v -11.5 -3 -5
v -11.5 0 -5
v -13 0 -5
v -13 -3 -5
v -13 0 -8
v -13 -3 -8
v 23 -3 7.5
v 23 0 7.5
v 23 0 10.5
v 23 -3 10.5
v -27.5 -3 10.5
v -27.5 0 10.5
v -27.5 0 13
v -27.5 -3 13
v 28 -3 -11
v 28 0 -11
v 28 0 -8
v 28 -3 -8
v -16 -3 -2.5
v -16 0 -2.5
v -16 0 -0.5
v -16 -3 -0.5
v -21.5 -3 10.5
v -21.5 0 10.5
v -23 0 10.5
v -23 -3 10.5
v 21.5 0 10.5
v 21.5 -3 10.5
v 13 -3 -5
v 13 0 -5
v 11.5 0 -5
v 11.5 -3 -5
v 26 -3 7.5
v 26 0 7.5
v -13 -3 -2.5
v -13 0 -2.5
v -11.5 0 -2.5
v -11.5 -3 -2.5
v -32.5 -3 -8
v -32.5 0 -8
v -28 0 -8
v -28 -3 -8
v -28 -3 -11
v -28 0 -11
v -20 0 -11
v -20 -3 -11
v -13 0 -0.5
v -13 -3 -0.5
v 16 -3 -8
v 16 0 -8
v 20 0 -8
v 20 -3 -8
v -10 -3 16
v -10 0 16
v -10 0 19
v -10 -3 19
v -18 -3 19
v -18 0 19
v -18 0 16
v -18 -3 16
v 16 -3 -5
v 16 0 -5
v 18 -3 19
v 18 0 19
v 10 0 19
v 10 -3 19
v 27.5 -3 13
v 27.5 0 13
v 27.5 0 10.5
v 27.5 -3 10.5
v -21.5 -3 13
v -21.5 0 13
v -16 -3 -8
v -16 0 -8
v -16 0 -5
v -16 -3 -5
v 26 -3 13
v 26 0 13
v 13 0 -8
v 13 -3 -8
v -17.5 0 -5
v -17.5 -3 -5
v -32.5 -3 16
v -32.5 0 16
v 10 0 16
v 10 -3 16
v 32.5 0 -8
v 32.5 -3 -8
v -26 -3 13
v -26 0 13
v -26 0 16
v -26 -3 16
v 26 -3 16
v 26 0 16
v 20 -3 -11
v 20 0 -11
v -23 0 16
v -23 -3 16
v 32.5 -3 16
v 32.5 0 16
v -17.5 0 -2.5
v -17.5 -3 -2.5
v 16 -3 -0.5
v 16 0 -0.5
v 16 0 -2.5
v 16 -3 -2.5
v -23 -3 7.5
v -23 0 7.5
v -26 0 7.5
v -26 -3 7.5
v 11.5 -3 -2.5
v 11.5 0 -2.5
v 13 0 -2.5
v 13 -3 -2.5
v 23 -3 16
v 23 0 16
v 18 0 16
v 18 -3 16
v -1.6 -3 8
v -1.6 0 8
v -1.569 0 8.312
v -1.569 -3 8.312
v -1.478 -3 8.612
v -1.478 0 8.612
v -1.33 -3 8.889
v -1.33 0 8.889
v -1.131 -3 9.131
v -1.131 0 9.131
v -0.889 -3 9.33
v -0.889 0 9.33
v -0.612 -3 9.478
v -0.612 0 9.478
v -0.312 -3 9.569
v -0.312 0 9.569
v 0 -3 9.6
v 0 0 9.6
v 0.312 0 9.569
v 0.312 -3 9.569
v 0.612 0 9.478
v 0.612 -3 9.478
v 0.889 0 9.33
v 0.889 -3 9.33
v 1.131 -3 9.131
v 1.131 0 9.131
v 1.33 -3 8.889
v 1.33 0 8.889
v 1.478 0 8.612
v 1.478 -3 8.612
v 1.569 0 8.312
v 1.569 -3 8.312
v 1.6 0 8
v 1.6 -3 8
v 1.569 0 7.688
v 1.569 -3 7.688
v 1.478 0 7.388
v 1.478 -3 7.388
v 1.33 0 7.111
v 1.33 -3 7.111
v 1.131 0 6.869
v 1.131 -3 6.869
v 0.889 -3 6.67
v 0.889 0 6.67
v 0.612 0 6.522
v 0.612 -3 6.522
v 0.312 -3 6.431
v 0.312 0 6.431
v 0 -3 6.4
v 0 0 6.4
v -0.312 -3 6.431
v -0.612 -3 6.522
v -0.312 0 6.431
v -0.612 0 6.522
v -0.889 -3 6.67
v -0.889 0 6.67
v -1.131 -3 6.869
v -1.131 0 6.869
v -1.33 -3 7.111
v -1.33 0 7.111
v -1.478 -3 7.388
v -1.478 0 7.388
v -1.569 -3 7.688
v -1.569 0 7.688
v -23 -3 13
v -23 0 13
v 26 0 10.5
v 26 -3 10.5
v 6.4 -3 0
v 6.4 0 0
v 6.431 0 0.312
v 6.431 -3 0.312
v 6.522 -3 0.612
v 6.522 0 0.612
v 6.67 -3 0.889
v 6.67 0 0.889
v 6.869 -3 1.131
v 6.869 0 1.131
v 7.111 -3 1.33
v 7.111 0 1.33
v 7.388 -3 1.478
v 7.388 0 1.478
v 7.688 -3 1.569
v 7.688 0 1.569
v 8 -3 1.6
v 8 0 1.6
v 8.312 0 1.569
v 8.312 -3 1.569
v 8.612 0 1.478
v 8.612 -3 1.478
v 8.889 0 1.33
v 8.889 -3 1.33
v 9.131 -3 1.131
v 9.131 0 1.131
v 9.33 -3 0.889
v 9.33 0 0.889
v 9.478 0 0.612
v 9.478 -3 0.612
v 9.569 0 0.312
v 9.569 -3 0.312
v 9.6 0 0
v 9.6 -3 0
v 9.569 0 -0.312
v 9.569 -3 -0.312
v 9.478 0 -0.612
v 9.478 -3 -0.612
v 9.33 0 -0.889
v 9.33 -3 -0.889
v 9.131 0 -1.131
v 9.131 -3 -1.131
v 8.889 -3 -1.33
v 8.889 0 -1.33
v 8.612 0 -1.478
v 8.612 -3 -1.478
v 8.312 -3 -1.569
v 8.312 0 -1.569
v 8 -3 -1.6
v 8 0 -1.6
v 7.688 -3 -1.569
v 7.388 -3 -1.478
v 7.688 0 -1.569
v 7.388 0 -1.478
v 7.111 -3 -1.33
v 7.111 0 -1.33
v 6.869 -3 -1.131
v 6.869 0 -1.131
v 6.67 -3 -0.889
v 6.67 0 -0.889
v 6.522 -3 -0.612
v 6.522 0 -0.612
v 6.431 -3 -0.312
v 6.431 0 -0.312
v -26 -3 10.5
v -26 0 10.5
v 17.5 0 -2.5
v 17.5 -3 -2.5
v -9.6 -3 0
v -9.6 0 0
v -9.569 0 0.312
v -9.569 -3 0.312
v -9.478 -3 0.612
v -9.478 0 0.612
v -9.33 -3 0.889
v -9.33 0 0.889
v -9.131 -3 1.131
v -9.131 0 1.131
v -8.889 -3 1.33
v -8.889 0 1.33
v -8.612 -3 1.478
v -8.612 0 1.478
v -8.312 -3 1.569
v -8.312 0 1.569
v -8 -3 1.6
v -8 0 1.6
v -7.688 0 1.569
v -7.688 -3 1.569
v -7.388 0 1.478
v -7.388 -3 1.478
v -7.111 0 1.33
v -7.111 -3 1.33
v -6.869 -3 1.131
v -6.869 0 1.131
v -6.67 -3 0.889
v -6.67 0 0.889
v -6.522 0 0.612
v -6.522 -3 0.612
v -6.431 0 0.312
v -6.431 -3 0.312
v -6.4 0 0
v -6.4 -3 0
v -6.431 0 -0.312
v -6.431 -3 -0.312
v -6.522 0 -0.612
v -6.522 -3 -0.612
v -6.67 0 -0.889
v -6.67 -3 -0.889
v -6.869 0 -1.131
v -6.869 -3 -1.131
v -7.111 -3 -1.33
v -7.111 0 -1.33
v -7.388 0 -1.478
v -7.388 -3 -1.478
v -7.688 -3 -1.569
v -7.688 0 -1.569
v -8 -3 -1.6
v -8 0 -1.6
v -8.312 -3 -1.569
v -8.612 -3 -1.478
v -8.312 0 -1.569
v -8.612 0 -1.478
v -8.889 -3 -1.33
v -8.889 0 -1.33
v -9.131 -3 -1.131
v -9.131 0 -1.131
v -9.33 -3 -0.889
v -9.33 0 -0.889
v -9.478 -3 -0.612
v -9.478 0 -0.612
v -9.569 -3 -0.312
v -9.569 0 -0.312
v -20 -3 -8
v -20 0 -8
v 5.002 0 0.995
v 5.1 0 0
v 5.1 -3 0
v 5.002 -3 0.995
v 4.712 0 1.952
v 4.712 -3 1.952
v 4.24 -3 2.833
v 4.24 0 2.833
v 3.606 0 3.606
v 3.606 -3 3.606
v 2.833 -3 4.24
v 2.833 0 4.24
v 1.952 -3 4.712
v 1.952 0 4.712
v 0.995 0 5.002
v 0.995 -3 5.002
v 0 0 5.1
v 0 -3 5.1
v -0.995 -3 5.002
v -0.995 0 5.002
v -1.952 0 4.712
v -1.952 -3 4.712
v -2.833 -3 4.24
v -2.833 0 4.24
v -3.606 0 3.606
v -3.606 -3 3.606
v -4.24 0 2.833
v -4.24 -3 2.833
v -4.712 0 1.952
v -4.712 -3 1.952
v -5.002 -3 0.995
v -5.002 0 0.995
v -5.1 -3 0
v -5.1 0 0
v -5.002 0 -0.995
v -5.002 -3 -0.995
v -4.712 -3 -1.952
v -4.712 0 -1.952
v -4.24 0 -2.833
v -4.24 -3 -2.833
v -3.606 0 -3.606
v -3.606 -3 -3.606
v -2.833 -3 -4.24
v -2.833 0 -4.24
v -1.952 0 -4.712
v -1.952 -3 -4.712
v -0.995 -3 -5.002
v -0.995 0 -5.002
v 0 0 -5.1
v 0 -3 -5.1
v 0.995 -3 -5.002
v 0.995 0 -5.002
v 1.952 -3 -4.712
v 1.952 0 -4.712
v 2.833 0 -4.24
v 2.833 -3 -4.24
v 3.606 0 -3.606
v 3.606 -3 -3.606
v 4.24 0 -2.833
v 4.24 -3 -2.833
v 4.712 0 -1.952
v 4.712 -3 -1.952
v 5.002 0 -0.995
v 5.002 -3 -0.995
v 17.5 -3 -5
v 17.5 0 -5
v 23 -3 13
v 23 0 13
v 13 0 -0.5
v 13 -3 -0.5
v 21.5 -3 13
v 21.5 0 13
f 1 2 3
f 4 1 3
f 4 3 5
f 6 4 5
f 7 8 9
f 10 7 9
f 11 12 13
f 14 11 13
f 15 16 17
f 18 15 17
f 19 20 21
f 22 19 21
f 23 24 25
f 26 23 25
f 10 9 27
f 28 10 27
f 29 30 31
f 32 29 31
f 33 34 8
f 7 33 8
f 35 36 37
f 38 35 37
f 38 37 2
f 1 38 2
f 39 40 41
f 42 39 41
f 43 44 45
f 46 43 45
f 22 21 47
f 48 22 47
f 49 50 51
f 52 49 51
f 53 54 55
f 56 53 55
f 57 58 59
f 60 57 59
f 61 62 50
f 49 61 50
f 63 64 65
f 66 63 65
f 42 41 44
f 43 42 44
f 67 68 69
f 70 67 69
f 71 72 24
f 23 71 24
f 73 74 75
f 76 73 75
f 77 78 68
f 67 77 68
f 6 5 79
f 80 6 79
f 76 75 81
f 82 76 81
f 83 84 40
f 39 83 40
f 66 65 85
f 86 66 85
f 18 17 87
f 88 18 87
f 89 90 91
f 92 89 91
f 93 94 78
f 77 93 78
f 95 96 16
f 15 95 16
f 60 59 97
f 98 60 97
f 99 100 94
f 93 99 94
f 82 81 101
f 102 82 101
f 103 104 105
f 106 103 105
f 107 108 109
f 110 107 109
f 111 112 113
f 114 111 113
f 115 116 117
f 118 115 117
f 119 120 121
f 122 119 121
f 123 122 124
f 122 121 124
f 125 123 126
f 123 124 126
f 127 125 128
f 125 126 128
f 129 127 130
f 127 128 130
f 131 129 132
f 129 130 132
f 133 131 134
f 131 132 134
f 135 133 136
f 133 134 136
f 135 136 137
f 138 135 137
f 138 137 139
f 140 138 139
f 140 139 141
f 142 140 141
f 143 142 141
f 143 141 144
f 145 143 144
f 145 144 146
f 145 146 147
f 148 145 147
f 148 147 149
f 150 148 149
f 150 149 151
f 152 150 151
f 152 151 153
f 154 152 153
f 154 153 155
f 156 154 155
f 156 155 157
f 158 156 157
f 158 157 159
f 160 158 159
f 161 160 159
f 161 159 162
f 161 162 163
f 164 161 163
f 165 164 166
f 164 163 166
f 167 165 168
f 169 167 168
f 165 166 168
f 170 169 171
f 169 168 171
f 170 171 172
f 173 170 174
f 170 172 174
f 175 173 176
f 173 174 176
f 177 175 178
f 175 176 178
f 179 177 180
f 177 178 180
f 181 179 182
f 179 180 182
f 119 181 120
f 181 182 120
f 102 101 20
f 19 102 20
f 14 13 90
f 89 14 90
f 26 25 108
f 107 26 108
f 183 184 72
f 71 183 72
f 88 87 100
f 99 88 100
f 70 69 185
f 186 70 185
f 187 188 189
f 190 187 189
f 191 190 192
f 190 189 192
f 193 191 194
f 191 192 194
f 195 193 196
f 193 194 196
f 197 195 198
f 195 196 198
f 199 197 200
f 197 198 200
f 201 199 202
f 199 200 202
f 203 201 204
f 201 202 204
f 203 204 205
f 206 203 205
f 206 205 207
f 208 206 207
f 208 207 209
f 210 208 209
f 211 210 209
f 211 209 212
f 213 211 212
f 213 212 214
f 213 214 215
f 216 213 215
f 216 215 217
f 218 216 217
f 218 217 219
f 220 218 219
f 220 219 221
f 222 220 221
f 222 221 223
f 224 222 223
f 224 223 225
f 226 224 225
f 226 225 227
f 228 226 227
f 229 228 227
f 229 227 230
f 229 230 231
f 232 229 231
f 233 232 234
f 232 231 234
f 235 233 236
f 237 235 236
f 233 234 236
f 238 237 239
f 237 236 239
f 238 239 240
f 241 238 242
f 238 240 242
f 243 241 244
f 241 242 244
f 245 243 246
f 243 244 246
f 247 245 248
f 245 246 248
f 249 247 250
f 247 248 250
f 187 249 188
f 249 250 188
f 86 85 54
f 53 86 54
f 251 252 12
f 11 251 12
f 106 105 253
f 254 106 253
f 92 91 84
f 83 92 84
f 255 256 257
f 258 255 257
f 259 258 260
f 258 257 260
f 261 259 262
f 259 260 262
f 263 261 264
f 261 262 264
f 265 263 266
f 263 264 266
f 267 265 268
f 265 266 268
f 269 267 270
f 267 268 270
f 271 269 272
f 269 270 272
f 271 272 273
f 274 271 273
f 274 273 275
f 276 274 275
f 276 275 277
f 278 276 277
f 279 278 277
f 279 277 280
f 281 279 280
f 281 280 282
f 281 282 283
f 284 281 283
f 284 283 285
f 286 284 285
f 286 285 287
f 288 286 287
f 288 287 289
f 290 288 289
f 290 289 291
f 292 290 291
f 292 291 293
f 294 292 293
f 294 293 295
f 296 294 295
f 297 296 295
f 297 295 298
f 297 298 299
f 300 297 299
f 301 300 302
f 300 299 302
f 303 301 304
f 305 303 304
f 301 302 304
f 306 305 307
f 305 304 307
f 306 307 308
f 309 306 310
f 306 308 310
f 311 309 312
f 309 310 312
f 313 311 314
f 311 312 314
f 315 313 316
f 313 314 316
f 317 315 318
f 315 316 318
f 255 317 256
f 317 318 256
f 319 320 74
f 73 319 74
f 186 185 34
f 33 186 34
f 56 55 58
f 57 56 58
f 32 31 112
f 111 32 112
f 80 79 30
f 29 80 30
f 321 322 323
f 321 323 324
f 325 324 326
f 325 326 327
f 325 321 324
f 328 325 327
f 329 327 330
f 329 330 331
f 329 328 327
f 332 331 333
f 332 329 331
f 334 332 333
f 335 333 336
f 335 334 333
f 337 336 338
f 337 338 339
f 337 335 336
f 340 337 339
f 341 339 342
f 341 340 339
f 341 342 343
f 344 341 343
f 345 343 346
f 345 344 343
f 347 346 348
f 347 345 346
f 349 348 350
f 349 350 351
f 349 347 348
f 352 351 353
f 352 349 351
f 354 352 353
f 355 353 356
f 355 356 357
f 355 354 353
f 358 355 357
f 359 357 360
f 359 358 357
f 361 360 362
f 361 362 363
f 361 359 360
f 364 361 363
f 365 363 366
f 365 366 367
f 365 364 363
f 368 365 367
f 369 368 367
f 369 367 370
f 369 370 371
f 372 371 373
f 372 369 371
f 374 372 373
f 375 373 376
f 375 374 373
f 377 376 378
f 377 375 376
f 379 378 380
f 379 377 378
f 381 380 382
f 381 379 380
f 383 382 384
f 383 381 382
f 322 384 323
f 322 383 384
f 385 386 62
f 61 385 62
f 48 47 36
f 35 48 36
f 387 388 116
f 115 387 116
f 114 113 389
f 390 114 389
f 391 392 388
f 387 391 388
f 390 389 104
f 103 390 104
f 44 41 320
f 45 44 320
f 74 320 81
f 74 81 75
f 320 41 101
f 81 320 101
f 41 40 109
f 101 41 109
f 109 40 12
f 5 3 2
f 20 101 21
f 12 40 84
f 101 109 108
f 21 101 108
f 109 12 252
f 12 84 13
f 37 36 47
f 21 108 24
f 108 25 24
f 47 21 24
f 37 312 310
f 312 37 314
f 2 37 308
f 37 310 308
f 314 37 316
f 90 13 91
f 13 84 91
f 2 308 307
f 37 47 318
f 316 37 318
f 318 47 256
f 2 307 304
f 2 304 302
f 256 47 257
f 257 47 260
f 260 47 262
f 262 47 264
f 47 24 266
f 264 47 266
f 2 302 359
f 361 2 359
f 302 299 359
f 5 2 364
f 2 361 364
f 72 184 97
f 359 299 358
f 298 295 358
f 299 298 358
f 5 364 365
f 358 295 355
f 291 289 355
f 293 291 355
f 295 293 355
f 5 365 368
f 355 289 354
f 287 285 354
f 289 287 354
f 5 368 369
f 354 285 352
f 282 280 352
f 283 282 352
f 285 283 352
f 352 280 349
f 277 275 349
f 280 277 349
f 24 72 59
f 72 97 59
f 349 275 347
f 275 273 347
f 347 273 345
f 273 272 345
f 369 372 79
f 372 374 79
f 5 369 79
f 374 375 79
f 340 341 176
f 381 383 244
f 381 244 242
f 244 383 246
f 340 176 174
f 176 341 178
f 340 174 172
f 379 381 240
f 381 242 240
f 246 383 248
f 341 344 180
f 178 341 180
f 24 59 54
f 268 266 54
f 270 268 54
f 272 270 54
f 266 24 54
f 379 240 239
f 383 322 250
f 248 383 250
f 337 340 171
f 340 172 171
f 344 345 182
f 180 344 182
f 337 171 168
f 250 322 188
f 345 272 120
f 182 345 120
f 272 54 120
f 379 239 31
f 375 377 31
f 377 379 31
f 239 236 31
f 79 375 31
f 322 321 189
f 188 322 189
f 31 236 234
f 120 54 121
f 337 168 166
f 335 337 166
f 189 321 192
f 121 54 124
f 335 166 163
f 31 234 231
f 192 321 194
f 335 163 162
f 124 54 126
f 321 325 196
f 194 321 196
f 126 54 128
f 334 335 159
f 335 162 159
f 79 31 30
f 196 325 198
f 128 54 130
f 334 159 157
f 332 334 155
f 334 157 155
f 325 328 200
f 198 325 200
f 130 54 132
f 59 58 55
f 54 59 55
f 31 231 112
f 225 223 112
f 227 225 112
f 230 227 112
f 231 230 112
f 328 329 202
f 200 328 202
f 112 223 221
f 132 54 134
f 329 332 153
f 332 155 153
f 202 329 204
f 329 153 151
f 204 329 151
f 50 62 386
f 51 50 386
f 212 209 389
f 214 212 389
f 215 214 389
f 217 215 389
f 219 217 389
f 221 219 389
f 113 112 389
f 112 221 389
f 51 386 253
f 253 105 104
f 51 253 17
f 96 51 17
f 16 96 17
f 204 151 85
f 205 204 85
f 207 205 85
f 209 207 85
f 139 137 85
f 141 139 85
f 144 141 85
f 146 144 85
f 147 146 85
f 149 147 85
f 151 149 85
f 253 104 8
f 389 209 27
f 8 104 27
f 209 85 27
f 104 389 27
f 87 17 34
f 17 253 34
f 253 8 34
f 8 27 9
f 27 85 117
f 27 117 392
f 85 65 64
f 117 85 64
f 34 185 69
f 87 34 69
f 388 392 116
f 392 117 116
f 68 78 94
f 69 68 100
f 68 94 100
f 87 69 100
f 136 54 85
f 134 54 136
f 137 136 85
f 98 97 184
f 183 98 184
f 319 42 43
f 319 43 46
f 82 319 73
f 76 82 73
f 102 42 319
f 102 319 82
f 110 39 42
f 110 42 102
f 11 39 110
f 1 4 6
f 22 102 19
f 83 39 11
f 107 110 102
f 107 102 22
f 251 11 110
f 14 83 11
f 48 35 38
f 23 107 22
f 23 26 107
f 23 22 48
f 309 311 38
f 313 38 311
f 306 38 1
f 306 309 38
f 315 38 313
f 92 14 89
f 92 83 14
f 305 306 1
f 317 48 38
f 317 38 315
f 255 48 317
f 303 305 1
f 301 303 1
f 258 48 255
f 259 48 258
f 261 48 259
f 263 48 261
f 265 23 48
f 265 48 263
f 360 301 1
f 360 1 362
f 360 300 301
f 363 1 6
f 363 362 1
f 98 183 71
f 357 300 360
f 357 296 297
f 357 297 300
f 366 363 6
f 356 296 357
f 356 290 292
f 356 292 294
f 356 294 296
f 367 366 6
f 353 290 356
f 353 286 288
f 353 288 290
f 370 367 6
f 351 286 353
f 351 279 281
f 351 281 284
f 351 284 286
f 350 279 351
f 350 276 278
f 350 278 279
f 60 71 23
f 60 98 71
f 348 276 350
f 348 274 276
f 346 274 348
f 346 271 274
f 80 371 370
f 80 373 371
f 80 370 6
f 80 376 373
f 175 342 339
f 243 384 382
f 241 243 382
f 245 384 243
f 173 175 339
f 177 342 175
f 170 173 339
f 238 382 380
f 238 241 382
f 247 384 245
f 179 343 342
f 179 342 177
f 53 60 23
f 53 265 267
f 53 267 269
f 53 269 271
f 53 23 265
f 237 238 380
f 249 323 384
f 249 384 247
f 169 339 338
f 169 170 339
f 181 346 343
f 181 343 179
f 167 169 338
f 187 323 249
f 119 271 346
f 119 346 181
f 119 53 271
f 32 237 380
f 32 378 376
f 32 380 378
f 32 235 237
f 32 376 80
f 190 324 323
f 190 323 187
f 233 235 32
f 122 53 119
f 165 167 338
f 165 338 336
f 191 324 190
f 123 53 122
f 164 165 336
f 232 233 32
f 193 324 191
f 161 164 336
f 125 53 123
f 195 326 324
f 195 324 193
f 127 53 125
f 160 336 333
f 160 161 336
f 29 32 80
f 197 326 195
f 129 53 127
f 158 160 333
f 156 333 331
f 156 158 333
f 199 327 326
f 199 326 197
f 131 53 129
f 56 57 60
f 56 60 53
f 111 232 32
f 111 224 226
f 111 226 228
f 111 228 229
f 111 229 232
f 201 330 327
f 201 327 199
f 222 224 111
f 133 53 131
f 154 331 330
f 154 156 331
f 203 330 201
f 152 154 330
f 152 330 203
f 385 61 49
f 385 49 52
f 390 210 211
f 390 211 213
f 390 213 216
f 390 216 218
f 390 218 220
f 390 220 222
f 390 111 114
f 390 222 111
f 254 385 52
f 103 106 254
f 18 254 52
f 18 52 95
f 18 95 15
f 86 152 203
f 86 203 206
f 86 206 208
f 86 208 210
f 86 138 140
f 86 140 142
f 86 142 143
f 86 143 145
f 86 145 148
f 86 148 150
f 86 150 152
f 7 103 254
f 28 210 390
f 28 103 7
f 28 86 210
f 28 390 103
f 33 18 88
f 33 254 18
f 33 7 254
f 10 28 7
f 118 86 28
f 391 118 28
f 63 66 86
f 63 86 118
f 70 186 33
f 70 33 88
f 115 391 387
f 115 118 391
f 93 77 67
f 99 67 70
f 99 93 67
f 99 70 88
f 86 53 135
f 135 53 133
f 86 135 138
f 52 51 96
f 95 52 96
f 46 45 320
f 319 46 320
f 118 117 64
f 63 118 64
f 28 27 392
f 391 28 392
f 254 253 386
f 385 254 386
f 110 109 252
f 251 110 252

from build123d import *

# Parameters (mm, degrees)
F0_R     = 5.1
F1_DEPTH = 3
F3_DEPTH = 3
F5_D     = 3.2
F5_DEPTH = 10
F5_TIP   = 0.9613769904


with BuildPart() as f1:
    # F0 (on Front) → F1 (new body)
    with BuildSketch(Plane.XZ):
        Polygon((28, -8), (32.5, -8), (32.5, 16), (18, 16), (18, 19), (10, 19), (10, 16), (0, 16), (-10, 16), (-10, 19), (-18, 19), (-18, 16), (-32.5, 16), (-32.5, -8), (-28, -8), (-28, -11), (-20, -11), (-20, -8), (0, -8), (20, -8), (20, -11), (28, -11), align=None)
        Circle(F0_R, mode=Mode.SUBTRACT)
    extrude(amount=F1_DEPTH)

    # F2 (on face) → F3 (cut, through all)
    with BuildSketch(Plane(origin=(0, 0, 0), x_dir=(-1, 0, 0), z_dir=(0, 1, 0))):
        Polygon((13, -5), (13, -8), (16, -8), (16, -5), (17.5, -5), (17.5, -2.5), (16, -2.5), (16, -0.5), (13, -0.5), (13, -2.5), (11.5, -2.5), (11.5, -5), align=None)
        Polygon((-16, -8), (-13, -8), (-13, -5), (-11.5, -5), (-11.5, -2.5), (-13, -2.5), (-13, -0.5), (-16, -0.5), (-16, -2.5), (-17.5, -2.5), (-17.5, -5), (-16, -5), align=None)
        Polygon((26, 13), (26, 16), (23, 16), (23, 13), (21.5, 13), (21.5, 10.5), (23, 10.5), (23, 7.5), (26, 7.5), (26, 10.5), (27.5, 10.5), (27.5, 13), align=None)
        Polygon((-23, 16), (-26, 16), (-26, 13), (-27.5, 13), (-27.5, 10.5), (-26, 10.5), (-26, 7.5), (-23, 7.5), (-23, 10.5), (-21.5, 10.5), (-21.5, 13), (-23, 13), align=None)
    extrude(amount=-F3_DEPTH, mode=Mode.SUBTRACT)

    # F5
    with Locations(Plane.XZ.offset(3)):
        with Locations((-8, 0), (0, 8), (8, 0)):
            Hole(F5_D / 2, depth=F5_DEPTH)
            with Locations((0, 0, -(F5_DEPTH + F5_TIP / 2))):  # 118° drill point
                Cone(0, F5_D / 2, F5_TIP, mode=Mode.SUBTRACT)


solid = f1.part
